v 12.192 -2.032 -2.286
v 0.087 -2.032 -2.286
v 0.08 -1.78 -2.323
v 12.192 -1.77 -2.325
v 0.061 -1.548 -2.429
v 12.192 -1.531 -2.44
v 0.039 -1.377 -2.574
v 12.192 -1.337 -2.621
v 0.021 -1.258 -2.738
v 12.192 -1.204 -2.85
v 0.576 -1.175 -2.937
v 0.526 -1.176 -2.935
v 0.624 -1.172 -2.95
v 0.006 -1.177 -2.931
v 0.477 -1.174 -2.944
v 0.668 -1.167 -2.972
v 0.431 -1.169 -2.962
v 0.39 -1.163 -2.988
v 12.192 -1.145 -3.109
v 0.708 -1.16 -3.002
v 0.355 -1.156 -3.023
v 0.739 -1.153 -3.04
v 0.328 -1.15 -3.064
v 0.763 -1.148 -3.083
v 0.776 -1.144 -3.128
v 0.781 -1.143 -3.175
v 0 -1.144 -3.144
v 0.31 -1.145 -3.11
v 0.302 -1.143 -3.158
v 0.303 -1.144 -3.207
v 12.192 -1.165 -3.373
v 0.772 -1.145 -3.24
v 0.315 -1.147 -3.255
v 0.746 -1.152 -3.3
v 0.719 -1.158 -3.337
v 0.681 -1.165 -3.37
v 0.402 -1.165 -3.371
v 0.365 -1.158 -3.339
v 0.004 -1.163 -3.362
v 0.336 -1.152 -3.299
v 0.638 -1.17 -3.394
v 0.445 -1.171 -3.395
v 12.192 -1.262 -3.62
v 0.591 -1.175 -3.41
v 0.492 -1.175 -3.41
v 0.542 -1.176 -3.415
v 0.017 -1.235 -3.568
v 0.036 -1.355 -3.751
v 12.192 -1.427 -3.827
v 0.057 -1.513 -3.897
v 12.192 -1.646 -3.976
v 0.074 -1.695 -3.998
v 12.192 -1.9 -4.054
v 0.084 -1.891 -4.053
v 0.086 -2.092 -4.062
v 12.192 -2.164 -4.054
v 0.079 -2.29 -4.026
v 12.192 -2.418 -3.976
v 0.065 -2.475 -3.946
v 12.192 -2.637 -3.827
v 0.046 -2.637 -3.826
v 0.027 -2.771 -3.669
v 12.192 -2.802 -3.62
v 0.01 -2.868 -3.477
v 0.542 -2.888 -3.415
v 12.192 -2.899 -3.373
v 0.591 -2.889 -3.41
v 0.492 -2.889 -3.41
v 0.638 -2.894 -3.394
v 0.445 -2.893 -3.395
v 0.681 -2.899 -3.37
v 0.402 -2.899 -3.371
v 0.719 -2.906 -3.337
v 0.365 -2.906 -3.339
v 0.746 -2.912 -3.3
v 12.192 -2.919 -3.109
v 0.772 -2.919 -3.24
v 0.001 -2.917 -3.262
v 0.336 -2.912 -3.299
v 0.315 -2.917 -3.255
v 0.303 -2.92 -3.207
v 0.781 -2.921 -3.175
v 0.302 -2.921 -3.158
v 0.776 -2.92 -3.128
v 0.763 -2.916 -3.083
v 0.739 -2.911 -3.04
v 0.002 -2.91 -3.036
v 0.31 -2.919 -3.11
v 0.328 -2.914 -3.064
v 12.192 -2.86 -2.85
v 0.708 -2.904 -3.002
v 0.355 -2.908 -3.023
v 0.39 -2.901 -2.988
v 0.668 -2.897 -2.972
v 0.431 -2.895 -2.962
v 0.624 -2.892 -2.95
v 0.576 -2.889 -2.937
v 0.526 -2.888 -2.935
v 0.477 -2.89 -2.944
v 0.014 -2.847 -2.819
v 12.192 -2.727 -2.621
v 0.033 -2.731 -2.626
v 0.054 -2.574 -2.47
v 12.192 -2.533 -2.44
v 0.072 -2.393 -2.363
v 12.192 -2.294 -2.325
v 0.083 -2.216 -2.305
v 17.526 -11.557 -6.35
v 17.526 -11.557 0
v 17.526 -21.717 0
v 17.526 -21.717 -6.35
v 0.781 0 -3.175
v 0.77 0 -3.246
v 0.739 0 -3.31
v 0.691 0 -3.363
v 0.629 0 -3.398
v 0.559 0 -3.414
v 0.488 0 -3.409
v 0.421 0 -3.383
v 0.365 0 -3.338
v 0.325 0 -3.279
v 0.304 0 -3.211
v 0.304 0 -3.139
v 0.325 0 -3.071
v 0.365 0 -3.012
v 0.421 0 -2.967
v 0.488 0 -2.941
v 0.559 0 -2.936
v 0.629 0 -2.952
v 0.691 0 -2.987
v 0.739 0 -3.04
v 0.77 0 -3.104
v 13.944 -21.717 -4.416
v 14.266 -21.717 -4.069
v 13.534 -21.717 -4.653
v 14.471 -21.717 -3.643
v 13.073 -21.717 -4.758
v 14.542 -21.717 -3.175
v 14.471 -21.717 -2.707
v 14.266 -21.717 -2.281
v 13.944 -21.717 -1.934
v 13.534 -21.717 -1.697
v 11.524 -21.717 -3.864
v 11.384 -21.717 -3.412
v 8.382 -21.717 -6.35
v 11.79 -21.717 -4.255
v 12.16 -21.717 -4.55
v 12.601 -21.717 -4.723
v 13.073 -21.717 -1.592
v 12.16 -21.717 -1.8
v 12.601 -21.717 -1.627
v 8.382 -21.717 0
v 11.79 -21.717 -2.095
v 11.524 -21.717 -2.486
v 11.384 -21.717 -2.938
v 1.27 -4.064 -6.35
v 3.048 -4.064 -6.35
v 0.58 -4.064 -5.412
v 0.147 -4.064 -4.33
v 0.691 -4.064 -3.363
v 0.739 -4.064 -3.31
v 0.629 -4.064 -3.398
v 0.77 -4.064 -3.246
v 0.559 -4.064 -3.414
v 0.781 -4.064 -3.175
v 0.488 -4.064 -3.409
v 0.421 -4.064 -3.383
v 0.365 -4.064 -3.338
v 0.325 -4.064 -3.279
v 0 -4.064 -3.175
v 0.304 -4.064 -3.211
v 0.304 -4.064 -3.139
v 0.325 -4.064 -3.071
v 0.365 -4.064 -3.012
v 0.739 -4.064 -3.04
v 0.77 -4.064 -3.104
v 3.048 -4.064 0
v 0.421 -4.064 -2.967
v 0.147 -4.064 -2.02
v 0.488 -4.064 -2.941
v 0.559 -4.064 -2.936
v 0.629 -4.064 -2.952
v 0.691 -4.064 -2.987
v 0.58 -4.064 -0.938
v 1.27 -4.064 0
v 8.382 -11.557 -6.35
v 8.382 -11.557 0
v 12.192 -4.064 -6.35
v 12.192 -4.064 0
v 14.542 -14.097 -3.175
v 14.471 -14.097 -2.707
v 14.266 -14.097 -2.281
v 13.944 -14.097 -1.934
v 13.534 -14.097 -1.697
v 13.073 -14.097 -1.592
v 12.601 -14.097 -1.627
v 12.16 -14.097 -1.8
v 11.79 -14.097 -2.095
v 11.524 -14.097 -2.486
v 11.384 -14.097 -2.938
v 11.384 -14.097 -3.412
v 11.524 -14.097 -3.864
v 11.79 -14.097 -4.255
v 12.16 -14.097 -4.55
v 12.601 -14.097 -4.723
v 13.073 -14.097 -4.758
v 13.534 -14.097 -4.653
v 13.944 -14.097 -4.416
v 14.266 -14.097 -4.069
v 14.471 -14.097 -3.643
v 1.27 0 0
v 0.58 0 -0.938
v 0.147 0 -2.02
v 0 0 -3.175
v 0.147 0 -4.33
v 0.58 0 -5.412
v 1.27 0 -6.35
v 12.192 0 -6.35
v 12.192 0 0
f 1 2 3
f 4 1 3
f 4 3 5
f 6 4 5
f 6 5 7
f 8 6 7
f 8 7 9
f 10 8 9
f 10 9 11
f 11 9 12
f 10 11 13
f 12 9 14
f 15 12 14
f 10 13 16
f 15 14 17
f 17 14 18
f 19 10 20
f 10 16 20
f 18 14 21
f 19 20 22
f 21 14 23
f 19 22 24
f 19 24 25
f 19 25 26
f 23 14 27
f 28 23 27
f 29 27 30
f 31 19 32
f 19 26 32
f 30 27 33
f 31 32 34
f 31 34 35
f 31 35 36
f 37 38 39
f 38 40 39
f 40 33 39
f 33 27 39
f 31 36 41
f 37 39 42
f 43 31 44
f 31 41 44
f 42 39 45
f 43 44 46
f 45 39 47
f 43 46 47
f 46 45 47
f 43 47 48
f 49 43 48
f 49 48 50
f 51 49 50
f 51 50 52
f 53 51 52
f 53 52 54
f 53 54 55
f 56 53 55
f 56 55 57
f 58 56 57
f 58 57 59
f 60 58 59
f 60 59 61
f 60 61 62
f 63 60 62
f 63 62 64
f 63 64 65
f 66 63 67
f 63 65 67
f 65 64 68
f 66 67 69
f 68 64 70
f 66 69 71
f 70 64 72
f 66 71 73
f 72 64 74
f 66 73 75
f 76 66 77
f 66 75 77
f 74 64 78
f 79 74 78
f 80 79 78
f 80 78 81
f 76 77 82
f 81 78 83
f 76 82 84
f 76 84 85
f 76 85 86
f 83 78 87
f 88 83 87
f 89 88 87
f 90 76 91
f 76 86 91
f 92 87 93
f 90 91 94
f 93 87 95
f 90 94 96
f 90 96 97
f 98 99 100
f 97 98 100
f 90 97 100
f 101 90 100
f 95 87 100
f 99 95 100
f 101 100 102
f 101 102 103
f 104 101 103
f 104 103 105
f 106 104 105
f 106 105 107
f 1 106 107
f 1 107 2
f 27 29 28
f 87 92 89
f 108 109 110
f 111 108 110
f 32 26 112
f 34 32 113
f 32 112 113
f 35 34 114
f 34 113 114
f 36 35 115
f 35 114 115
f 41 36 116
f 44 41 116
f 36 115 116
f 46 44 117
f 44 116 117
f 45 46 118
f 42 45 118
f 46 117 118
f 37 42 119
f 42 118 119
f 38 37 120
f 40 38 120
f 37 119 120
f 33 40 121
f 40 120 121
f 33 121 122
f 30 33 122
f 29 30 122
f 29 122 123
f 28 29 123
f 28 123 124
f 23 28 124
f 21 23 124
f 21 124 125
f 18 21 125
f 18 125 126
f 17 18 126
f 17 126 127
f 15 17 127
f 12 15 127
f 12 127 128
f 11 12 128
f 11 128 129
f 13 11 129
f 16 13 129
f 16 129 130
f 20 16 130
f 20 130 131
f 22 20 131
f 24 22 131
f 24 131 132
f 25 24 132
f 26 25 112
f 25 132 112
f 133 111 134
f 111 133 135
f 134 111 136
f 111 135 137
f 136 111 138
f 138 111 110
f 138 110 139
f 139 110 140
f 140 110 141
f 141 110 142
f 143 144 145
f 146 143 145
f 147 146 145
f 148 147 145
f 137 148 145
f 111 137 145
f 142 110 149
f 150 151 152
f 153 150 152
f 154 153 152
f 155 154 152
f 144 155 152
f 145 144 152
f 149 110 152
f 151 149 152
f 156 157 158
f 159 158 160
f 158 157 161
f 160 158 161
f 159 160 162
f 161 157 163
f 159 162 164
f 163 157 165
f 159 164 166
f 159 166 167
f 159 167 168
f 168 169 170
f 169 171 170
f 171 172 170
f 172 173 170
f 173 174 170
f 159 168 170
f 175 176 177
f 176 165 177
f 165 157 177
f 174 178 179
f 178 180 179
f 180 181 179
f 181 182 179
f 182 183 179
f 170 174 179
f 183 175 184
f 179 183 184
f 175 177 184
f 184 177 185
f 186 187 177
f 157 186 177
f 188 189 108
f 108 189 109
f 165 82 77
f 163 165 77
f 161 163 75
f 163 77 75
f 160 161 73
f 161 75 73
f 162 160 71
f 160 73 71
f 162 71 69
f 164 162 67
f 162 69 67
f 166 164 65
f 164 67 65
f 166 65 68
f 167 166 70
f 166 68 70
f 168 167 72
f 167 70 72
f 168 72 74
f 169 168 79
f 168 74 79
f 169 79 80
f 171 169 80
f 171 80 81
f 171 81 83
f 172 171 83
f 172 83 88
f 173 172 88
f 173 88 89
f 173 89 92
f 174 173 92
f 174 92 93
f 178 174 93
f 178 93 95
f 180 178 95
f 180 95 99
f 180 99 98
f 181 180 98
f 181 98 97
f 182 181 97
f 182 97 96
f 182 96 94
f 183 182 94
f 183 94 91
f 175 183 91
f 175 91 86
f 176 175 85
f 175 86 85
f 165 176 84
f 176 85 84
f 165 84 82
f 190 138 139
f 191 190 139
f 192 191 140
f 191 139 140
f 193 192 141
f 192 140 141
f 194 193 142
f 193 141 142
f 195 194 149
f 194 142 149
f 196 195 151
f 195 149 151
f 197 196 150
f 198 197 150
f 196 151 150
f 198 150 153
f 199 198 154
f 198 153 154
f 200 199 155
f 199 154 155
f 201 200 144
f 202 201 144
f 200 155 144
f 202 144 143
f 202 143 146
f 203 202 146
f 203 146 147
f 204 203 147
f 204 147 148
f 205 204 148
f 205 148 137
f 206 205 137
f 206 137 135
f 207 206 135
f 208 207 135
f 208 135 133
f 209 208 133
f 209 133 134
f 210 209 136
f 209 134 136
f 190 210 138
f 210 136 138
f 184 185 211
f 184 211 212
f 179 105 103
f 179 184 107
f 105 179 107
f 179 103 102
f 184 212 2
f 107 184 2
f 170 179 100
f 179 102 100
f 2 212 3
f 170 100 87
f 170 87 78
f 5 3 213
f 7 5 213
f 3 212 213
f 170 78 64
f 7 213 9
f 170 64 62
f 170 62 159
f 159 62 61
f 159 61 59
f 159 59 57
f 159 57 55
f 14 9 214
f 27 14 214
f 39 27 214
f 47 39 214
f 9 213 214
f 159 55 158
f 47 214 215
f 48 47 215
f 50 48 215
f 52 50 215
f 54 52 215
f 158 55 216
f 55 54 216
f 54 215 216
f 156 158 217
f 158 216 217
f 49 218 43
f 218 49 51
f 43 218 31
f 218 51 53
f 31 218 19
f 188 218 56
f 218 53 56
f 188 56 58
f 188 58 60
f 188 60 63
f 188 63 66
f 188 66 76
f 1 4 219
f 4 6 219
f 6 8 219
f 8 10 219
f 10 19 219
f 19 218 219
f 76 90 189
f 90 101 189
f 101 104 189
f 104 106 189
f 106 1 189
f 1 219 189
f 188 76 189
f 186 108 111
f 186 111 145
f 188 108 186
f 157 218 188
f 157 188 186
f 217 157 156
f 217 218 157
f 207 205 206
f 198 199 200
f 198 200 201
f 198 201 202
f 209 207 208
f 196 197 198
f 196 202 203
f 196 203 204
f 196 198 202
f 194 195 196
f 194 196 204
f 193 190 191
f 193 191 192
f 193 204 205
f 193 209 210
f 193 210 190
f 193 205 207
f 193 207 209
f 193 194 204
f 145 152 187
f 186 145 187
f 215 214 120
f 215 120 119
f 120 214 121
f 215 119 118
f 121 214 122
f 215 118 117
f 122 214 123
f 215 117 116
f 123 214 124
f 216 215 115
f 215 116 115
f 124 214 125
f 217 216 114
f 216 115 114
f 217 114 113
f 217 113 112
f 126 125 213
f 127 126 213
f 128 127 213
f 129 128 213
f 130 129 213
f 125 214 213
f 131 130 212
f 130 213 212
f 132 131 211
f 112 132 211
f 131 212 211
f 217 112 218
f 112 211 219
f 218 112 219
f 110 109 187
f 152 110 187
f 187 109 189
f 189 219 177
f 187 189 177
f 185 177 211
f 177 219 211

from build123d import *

# Parameters (mm, degrees)
BOSS_EXTRUDE1_DEPTH   = 6.35
CUT_EXTRUDE1_DEPTH    = 6.35
SKETCH5_R             = 1.5875
CUT_EXTRUDE4_DEPTH    = 7.62
SKETCH7_R             = 0.24003
CUT_EXTRUDE5_DEPTH    = 22.717
F_2_56_TAPPED_HOLE1_D = 1.778


with BuildPart() as part:
    # Sketch1 → Boss-Extrude1 (new body)
    with BuildSketch(Plane.XY):
        Polygon((0, 0), (12.192, 0), (12.192, -4.064), (17.526, -11.557), (17.526, -21.717), (8.382, -21.717), (8.382, -11.557), (3.048, -4.064), (0, -4.064), align=None)
    extrude(amount=-BOSS_EXTRUDE1_DEPTH)

    # Sketch2 → Cut-Extrude1 (cut)
    with BuildSketch(Plane(origin=(0, 0, 0), x_dir=(1, 0, 0), z_dir=(0, 1, 0))):
        with BuildLine():
            Line((1.27, 6.35), (-1.332869865, 6.35))
            Line((-1.332869865, 6.35), (-1.332869865, 0))
            Line((-1.332869865, 0), (1.27, 0))
            ThreePointArc((1.27, 0), (0, 3.175), (1.27, 6.35))
        make_face()
    extrude(amount=-CUT_EXTRUDE1_DEPTH, mode=Mode.SUBTRACT)

    # Sketch5 → Cut-Extrude4 (cut)
    with BuildSketch(Plane.XZ.offset(21.717)):
        with Locations((12.954, -3.175)):
            Circle(SKETCH5_R)
    extrude(amount=-CUT_EXTRUDE4_DEPTH, mode=Mode.SUBTRACT)

    # Sketch7 → Cut-Extrude5 (cut, through all)
    with BuildSketch(Plane(origin=(0, 0, 0), x_dir=(1, 0, 0), z_dir=(0, 1, 0))):
        with Locations((0.54102, 3.175)):
            Circle(SKETCH7_R)
    extrude(amount=-CUT_EXTRUDE5_DEPTH, mode=Mode.SUBTRACT)

    # #2-56 Tapped Hole1 (through all)
    with Locations(Plane(origin=(12.192, 0, 0), x_dir=(0, 0, -1), z_dir=(1, 0, 0))):
        with Locations((3.175, -2.032)):
            Hole(F_2_56_TAPPED_HOLE1_D / 2)


solid = part.part
